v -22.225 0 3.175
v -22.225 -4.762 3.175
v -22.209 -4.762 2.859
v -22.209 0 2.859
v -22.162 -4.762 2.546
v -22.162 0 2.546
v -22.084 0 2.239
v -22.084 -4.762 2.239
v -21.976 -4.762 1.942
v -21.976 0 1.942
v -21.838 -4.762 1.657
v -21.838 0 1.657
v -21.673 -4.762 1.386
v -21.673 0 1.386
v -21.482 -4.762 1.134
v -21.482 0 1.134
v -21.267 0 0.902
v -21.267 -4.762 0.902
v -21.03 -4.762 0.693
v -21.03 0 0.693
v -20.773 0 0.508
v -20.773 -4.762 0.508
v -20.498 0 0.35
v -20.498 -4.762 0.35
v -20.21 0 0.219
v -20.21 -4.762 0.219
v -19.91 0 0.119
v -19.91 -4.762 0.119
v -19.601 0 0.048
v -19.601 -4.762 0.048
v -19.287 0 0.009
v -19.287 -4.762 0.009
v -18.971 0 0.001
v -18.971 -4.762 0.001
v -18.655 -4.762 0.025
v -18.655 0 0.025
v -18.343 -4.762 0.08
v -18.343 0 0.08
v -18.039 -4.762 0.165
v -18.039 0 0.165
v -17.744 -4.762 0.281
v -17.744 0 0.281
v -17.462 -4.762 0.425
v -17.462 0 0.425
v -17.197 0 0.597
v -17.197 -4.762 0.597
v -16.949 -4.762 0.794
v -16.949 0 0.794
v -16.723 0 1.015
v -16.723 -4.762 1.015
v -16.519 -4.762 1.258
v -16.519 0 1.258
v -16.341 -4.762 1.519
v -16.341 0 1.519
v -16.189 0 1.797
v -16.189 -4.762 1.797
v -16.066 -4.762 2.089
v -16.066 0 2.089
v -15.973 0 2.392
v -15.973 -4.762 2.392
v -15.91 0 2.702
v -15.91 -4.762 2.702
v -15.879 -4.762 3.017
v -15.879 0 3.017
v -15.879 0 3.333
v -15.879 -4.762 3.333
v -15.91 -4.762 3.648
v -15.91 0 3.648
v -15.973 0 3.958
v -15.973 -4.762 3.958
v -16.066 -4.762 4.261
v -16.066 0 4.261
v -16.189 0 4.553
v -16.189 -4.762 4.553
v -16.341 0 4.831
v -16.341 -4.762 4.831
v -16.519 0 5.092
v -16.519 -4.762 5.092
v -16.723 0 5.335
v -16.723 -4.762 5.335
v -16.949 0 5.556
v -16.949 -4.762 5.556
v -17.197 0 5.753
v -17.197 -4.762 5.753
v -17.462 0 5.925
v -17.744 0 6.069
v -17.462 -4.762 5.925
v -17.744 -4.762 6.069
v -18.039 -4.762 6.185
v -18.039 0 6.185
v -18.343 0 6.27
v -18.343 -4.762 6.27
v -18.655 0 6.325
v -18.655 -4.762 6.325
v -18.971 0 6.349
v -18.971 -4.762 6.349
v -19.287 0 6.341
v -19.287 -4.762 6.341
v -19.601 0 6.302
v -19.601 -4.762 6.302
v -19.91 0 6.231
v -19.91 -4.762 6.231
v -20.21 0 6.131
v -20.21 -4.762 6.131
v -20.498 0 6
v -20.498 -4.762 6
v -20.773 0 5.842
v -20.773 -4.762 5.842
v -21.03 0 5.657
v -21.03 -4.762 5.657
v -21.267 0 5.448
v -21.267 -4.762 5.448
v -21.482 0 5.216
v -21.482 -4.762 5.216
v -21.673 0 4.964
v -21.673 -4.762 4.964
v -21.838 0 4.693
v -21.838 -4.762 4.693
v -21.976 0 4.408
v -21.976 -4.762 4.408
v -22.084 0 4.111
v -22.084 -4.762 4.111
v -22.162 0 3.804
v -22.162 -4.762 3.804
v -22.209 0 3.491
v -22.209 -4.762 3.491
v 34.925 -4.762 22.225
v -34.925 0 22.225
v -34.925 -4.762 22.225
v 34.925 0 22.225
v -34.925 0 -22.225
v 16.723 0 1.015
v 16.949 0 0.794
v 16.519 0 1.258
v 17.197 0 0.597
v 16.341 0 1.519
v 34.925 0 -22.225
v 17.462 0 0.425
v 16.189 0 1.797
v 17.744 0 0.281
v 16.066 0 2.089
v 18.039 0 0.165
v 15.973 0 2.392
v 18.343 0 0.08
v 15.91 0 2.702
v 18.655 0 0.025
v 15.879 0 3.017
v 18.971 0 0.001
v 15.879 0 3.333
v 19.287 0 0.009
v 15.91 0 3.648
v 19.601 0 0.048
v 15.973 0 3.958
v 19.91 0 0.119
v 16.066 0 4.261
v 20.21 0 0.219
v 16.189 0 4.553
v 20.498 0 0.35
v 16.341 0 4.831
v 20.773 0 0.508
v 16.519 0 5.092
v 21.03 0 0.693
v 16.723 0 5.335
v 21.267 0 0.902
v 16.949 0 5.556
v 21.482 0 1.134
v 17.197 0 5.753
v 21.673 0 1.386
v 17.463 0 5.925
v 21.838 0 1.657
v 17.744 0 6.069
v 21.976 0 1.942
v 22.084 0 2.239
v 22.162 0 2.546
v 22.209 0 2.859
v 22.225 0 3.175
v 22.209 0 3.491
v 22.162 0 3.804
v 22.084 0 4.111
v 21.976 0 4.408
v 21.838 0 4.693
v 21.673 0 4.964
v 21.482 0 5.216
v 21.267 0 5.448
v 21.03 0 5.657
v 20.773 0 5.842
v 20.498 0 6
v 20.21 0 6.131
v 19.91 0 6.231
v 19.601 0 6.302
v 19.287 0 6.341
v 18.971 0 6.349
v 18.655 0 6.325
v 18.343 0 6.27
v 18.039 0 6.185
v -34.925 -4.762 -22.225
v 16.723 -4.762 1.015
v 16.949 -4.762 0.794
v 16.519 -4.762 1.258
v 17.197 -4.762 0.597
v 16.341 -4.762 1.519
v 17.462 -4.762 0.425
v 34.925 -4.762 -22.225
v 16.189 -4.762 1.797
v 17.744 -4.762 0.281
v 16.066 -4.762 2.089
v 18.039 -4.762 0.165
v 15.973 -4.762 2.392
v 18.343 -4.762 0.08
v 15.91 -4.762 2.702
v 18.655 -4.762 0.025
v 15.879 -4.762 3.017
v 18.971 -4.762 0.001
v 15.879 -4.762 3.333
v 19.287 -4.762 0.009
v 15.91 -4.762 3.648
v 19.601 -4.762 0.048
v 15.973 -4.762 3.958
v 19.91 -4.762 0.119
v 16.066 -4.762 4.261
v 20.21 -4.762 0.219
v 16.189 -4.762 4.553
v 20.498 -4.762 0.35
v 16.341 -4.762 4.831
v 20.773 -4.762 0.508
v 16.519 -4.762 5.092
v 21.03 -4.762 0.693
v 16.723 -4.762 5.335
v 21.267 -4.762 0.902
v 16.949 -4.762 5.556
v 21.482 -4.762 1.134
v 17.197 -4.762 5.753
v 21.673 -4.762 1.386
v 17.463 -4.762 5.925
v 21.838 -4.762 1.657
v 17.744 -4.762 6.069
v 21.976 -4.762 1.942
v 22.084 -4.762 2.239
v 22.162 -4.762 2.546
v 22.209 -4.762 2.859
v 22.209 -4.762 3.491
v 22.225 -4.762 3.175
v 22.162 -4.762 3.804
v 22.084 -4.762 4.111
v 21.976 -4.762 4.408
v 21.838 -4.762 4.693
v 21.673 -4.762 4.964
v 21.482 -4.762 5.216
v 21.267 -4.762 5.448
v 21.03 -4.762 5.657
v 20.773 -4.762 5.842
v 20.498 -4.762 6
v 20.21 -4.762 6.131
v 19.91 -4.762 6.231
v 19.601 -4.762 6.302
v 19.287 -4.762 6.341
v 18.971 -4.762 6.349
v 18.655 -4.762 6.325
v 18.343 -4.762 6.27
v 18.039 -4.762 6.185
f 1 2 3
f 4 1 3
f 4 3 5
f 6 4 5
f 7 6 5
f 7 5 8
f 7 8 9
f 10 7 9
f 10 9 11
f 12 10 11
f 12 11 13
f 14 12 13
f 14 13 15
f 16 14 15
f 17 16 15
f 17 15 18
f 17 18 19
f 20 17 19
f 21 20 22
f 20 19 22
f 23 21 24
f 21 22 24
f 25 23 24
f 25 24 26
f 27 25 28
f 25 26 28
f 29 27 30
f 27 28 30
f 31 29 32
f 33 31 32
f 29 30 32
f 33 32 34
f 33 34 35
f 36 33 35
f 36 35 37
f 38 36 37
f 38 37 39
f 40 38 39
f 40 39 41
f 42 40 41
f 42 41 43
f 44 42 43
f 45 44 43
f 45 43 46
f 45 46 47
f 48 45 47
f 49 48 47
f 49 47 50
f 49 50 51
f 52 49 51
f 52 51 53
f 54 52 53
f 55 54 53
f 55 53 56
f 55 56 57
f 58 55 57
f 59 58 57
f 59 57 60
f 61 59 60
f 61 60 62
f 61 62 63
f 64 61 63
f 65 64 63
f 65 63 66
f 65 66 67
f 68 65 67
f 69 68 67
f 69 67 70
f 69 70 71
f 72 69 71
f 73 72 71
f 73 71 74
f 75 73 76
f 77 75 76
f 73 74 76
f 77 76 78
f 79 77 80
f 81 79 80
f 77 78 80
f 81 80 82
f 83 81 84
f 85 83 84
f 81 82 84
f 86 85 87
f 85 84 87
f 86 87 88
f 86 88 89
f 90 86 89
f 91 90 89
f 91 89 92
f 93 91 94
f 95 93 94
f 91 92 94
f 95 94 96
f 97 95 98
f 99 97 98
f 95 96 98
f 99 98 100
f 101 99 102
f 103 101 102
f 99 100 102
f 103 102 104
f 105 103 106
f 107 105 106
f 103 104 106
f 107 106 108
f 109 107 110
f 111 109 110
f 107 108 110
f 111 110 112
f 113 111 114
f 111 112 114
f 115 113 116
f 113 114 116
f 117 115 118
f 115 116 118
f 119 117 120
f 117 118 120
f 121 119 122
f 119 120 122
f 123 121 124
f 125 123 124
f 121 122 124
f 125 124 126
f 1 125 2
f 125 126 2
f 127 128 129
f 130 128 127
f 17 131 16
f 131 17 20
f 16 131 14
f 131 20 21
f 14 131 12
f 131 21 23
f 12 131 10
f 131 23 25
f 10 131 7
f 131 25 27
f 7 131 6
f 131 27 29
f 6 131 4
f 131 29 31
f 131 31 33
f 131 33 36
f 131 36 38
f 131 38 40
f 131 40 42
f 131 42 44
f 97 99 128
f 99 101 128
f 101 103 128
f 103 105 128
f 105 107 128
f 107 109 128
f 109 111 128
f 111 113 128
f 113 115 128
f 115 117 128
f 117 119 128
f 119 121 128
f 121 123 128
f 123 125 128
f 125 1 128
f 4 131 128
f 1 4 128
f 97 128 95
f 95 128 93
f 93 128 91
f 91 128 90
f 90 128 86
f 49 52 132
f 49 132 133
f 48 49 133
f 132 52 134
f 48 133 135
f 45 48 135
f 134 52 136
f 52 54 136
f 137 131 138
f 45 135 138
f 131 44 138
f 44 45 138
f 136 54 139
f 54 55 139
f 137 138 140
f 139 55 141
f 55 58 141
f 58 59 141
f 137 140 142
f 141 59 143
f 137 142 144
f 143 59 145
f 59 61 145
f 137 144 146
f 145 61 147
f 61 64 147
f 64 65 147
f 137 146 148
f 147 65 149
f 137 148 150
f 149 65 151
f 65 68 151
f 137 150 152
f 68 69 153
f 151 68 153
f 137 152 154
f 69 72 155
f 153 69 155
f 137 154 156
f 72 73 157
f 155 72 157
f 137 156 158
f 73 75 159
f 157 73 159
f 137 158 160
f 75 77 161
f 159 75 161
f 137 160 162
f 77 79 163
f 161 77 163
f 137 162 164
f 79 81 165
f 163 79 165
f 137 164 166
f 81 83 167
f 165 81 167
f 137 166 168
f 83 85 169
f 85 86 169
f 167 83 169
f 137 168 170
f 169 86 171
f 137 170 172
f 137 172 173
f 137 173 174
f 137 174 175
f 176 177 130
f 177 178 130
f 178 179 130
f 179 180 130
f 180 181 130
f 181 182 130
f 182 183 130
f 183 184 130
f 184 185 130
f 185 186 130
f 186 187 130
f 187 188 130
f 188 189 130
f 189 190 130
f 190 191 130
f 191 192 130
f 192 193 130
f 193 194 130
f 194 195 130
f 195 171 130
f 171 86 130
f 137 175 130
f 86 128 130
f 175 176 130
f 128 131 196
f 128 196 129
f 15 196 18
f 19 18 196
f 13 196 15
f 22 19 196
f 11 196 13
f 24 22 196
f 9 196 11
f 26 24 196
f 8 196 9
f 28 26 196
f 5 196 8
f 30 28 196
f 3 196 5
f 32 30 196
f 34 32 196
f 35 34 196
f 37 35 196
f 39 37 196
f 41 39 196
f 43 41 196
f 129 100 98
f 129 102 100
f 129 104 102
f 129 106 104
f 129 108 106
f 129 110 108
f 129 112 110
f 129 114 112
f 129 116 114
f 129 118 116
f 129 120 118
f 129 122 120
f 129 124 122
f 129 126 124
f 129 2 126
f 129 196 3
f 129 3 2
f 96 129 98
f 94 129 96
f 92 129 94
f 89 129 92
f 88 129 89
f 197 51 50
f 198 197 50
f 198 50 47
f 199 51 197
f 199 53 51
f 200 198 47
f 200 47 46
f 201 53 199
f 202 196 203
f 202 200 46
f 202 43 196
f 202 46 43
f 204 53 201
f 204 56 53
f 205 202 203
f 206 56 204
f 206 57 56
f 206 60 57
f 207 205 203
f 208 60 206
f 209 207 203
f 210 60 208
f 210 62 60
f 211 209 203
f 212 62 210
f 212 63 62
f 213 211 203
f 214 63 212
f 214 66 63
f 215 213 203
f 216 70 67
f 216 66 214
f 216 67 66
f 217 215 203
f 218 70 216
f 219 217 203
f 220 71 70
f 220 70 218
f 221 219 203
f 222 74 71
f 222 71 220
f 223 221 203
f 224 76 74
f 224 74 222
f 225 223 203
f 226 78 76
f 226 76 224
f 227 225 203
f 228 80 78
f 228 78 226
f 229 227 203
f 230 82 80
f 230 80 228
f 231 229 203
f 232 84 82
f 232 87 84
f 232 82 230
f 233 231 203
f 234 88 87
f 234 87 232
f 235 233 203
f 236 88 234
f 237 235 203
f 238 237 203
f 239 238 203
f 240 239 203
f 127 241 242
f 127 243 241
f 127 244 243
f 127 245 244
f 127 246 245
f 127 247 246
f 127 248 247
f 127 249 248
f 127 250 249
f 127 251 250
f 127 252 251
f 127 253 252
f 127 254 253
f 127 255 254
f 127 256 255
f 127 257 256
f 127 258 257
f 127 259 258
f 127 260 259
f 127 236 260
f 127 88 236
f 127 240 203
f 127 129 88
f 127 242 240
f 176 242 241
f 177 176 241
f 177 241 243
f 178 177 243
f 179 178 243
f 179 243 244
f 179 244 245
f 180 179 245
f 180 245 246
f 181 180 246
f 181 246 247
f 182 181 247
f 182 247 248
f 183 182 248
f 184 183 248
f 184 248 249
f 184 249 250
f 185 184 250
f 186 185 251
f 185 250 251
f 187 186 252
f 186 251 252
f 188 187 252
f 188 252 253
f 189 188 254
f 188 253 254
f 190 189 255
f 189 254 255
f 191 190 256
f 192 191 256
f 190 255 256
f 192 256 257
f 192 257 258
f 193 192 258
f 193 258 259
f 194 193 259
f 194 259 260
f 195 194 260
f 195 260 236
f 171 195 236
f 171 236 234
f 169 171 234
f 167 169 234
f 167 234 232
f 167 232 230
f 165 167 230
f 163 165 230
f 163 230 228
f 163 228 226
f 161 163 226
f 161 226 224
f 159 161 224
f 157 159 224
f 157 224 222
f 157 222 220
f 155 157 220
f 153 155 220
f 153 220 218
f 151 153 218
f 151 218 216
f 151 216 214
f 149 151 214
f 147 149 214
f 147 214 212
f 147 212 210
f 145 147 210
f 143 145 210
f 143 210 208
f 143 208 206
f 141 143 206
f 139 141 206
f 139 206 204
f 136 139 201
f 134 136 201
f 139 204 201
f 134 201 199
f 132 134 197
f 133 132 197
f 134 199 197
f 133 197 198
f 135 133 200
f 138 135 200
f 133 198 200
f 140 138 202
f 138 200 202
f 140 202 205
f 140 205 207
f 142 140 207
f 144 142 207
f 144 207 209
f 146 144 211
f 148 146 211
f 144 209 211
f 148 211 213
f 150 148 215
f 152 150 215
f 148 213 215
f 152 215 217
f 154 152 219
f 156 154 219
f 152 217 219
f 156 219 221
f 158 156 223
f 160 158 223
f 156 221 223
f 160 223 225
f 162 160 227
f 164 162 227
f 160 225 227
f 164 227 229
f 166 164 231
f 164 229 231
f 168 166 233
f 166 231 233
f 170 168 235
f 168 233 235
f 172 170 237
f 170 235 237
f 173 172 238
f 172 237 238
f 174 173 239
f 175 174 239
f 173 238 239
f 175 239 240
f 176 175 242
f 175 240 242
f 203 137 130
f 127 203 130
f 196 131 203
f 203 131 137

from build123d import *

# Parameters (mm, degrees)
F0_W     = 69.85
F0_H     = 44.45
F1_DEPTH = 4.7625
F2_R     = 3.175
F3_DEPTH = 25.4


with BuildPart() as f1:
    # F0 (on Front) → F1 (new body)
    with BuildSketch(Plane.XZ):
        Rectangle(F0_W, F0_H)
    extrude(amount=F1_DEPTH)

    # F2 (on face) → F3 (cut)
    with BuildSketch(Plane.XZ.offset(4.7625)):
        with BuildLine():
            ThreePointArc((-15.875, 3.175), (-19.05, 6.35), (-22.225, 3.175))
            ThreePointArc((-22.225, 3.175), (-19.05, 0), (-15.875, 3.175))
        make_face()
        with Locations((19.05, 3.175)):
            Circle(F2_R)
    extrude(amount=-F3_DEPTH, mode=Mode.SUBTRACT)


solid = f1.part
